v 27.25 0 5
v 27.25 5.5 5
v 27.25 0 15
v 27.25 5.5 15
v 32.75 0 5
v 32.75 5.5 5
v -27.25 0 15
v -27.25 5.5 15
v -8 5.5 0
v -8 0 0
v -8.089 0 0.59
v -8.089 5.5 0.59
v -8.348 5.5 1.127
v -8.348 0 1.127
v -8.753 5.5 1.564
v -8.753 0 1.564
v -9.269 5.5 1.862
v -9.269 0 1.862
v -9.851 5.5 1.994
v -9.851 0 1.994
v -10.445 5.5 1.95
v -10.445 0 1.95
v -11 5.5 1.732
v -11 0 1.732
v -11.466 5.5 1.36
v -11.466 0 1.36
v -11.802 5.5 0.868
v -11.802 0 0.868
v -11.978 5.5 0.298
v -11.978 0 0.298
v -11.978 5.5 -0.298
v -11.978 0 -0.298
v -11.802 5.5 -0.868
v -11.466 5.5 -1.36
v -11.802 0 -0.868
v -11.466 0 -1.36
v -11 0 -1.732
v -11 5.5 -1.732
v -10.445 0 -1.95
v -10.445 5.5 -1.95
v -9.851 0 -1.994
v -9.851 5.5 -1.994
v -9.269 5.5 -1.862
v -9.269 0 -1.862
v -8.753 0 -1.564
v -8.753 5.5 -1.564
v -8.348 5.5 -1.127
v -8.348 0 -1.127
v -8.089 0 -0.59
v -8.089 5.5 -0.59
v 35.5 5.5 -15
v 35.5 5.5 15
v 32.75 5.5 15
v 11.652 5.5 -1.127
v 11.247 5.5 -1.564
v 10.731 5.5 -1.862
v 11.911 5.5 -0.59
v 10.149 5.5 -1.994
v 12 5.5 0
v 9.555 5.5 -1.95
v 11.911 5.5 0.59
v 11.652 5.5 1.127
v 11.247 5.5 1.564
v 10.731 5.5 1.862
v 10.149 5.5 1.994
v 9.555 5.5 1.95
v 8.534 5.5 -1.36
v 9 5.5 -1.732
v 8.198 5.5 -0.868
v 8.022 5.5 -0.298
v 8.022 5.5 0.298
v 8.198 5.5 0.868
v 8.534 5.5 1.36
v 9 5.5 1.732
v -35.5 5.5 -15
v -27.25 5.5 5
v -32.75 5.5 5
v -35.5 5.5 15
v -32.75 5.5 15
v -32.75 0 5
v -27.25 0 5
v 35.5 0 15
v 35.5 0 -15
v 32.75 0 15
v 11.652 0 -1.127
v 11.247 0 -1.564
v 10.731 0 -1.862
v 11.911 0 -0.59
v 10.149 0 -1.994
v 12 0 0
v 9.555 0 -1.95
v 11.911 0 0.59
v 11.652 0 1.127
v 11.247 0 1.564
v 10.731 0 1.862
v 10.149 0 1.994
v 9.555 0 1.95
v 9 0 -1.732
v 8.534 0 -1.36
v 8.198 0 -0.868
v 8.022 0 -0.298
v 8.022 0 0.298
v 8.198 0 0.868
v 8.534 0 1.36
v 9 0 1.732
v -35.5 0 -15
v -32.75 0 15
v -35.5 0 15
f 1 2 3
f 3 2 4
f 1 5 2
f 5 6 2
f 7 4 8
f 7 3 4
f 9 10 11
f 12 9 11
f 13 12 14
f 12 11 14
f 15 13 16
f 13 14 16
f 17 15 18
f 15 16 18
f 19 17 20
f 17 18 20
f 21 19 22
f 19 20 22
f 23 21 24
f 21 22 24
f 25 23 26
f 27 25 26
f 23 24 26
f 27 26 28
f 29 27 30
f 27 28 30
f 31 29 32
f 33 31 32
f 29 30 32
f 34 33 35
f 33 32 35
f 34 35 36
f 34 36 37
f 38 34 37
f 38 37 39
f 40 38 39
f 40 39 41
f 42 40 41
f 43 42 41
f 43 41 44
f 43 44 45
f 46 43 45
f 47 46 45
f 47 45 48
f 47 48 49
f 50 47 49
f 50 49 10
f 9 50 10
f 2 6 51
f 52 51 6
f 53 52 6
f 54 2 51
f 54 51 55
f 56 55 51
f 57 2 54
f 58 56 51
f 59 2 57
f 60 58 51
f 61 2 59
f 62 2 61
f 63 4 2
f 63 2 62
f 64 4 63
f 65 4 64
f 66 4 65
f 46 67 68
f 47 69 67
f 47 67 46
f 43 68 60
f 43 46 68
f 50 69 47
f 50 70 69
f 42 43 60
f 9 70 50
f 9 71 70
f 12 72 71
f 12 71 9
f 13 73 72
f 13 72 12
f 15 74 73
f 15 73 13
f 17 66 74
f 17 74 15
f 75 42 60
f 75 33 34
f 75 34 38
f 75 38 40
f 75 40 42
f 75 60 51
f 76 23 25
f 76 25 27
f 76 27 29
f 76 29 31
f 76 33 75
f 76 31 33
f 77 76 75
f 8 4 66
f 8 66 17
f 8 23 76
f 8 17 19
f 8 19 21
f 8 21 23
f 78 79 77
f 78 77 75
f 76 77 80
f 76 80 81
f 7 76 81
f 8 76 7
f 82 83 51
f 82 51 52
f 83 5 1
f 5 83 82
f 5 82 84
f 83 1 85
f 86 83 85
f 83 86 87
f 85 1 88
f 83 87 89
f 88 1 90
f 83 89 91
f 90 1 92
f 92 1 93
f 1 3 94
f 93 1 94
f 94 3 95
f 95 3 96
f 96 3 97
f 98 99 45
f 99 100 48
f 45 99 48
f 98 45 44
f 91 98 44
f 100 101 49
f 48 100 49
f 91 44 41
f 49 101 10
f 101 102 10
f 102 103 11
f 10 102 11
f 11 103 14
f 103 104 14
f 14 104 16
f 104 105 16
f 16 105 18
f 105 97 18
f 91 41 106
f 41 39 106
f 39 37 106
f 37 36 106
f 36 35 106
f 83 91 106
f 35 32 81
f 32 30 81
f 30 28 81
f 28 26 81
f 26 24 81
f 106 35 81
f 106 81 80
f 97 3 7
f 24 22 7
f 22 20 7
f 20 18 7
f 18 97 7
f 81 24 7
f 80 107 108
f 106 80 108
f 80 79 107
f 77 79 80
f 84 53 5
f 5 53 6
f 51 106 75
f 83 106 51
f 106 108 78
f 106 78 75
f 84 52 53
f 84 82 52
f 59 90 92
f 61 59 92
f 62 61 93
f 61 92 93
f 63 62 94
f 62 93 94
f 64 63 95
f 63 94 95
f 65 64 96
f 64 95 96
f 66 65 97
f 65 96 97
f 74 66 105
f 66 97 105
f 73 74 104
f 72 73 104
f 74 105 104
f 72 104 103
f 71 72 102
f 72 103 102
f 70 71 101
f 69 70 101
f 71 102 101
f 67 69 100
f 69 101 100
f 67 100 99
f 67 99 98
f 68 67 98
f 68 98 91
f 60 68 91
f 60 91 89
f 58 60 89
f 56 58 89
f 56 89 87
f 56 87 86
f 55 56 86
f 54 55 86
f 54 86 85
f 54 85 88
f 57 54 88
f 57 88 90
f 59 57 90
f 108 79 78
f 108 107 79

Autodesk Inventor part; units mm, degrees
ref_plane "YZ Plane" through (0, 0, 0) normal (1, 0, 0) x (0, 1, 0)
ref_plane "XZ Plane" through (0, 0, 0) normal (0, 1, 0) x (-1, 0, 0)
ref_plane "XY Plane" through (0, 0, 0) normal (0, 0, 1) x (1, 0, 0)
sketch "Sketch1" plane through (0, 0, 0) normal (0, 1, 0) x (-1, 0, 0)
  line L0 (35.5, -15) -> (-35.5, -15)
  line L1 (-35.5, -15) -> (-35.5, 15)
  line L2 (-35.5, 15) -> (35.5, 15)
  line L3 (35.5, 15) -> (35.5, -15)
  line L4 (35.5, -15) -> (-35.5, 15) construction
  line L5 (-35.5, -15) -> (35.5, 15) construction
  point P0 (0, 0)
  dimension "d0" = 71
  dimension "d5" = 30
extrude "Extrusion1" add sketch "Sketch1" along normal blind 5.5
sketch "Sketch3" plane through (0, 5.5, 0) normal (0, 1, 0) x (1, 0, 0)
  line L0 (-35.5, -15) -> (35.5, -15) projected
  line L1 (0, 22.4425) -> (0, -29.6547) projected
  line L2 (-27.25, -15) -> (-32.75, -15)
  line L3 (-32.75, -15) -> (-32.75, -5)
  line L4 (-32.75, -5) -> (-27.25, -5)
  line L5 (-27.25, -5) -> (-27.25, -15)
  line L6 (-30, -0.7186) -> (-30, -17.2123)
  line L7 (27.25, -15) -> (32.75, -15)
  line L8 (32.75, -15) -> (32.75, -5)
  line L9 (32.75, -5) -> (27.25, -5)
  line L10 (27.25, -5) -> (27.25, -15)
  point P0 (0, 0)
  dimension "d6" = 5.5
  dimension "d7" = 10
  dimension "d8" = 30
extrude "Extrusion2" cut sketch "Sketch3" against normal through all
sketch "Sketch4" plane through (0, 5.5, 0) normal (0, 1, 0) x (1, 0, 0)
  line L0 (-27.25, -5) -> (-27.25, -15) projected
  line L1 (-27.25, -15) -> (27.25, -15) projected
  line L2 (27.25, -15) -> (27.25, -5) projected
  line L3 (27.25, -5) -> (32.75, -5) projected
  line L4 (32.75, -5) -> (32.75, -15) projected
  line L5 (32.75, -15) -> (35.5, -15) projected
  line L6 (35.5, -15) -> (35.5, 15) projected
  line L7 (35.5, 15) -> (-35.5, 15) projected
  line L8 (-35.5, 15) -> (-35.5, -15) projected
  line L9 (-35.5, -15) -> (-32.75, -15) projected
  line L10 (-32.75, -15) -> (-32.75, -5) projected
  line L11 (-32.75, -5) -> (-27.25, -5) projected
  point P0 (0, 0)
sketch "Sketch5" plane through (0, 0, 0) normal (0, -1, 0) x (1, 0, 0)
  line L0 (-49.7, 0) -> (49.7, 0) projected
  line L1 (0, -21) -> (0, 21) projected
  circle A0 centre (-10, 0) radius 2
  circle A1 centre (10, 0) radius 2
  point P0 (0, 0)
  dimension "d11" = 4
  dimension "d12" = 20
extrude "Extrusion3" cut sketch "Sketch5" against normal through all
equation "\"d1\" = Wt"
equation "\"d6\" = Wt"
equation "\"Wt\" = 5.5"
properties part number "ex_holder_stopper" material "Wood (Birch)"
